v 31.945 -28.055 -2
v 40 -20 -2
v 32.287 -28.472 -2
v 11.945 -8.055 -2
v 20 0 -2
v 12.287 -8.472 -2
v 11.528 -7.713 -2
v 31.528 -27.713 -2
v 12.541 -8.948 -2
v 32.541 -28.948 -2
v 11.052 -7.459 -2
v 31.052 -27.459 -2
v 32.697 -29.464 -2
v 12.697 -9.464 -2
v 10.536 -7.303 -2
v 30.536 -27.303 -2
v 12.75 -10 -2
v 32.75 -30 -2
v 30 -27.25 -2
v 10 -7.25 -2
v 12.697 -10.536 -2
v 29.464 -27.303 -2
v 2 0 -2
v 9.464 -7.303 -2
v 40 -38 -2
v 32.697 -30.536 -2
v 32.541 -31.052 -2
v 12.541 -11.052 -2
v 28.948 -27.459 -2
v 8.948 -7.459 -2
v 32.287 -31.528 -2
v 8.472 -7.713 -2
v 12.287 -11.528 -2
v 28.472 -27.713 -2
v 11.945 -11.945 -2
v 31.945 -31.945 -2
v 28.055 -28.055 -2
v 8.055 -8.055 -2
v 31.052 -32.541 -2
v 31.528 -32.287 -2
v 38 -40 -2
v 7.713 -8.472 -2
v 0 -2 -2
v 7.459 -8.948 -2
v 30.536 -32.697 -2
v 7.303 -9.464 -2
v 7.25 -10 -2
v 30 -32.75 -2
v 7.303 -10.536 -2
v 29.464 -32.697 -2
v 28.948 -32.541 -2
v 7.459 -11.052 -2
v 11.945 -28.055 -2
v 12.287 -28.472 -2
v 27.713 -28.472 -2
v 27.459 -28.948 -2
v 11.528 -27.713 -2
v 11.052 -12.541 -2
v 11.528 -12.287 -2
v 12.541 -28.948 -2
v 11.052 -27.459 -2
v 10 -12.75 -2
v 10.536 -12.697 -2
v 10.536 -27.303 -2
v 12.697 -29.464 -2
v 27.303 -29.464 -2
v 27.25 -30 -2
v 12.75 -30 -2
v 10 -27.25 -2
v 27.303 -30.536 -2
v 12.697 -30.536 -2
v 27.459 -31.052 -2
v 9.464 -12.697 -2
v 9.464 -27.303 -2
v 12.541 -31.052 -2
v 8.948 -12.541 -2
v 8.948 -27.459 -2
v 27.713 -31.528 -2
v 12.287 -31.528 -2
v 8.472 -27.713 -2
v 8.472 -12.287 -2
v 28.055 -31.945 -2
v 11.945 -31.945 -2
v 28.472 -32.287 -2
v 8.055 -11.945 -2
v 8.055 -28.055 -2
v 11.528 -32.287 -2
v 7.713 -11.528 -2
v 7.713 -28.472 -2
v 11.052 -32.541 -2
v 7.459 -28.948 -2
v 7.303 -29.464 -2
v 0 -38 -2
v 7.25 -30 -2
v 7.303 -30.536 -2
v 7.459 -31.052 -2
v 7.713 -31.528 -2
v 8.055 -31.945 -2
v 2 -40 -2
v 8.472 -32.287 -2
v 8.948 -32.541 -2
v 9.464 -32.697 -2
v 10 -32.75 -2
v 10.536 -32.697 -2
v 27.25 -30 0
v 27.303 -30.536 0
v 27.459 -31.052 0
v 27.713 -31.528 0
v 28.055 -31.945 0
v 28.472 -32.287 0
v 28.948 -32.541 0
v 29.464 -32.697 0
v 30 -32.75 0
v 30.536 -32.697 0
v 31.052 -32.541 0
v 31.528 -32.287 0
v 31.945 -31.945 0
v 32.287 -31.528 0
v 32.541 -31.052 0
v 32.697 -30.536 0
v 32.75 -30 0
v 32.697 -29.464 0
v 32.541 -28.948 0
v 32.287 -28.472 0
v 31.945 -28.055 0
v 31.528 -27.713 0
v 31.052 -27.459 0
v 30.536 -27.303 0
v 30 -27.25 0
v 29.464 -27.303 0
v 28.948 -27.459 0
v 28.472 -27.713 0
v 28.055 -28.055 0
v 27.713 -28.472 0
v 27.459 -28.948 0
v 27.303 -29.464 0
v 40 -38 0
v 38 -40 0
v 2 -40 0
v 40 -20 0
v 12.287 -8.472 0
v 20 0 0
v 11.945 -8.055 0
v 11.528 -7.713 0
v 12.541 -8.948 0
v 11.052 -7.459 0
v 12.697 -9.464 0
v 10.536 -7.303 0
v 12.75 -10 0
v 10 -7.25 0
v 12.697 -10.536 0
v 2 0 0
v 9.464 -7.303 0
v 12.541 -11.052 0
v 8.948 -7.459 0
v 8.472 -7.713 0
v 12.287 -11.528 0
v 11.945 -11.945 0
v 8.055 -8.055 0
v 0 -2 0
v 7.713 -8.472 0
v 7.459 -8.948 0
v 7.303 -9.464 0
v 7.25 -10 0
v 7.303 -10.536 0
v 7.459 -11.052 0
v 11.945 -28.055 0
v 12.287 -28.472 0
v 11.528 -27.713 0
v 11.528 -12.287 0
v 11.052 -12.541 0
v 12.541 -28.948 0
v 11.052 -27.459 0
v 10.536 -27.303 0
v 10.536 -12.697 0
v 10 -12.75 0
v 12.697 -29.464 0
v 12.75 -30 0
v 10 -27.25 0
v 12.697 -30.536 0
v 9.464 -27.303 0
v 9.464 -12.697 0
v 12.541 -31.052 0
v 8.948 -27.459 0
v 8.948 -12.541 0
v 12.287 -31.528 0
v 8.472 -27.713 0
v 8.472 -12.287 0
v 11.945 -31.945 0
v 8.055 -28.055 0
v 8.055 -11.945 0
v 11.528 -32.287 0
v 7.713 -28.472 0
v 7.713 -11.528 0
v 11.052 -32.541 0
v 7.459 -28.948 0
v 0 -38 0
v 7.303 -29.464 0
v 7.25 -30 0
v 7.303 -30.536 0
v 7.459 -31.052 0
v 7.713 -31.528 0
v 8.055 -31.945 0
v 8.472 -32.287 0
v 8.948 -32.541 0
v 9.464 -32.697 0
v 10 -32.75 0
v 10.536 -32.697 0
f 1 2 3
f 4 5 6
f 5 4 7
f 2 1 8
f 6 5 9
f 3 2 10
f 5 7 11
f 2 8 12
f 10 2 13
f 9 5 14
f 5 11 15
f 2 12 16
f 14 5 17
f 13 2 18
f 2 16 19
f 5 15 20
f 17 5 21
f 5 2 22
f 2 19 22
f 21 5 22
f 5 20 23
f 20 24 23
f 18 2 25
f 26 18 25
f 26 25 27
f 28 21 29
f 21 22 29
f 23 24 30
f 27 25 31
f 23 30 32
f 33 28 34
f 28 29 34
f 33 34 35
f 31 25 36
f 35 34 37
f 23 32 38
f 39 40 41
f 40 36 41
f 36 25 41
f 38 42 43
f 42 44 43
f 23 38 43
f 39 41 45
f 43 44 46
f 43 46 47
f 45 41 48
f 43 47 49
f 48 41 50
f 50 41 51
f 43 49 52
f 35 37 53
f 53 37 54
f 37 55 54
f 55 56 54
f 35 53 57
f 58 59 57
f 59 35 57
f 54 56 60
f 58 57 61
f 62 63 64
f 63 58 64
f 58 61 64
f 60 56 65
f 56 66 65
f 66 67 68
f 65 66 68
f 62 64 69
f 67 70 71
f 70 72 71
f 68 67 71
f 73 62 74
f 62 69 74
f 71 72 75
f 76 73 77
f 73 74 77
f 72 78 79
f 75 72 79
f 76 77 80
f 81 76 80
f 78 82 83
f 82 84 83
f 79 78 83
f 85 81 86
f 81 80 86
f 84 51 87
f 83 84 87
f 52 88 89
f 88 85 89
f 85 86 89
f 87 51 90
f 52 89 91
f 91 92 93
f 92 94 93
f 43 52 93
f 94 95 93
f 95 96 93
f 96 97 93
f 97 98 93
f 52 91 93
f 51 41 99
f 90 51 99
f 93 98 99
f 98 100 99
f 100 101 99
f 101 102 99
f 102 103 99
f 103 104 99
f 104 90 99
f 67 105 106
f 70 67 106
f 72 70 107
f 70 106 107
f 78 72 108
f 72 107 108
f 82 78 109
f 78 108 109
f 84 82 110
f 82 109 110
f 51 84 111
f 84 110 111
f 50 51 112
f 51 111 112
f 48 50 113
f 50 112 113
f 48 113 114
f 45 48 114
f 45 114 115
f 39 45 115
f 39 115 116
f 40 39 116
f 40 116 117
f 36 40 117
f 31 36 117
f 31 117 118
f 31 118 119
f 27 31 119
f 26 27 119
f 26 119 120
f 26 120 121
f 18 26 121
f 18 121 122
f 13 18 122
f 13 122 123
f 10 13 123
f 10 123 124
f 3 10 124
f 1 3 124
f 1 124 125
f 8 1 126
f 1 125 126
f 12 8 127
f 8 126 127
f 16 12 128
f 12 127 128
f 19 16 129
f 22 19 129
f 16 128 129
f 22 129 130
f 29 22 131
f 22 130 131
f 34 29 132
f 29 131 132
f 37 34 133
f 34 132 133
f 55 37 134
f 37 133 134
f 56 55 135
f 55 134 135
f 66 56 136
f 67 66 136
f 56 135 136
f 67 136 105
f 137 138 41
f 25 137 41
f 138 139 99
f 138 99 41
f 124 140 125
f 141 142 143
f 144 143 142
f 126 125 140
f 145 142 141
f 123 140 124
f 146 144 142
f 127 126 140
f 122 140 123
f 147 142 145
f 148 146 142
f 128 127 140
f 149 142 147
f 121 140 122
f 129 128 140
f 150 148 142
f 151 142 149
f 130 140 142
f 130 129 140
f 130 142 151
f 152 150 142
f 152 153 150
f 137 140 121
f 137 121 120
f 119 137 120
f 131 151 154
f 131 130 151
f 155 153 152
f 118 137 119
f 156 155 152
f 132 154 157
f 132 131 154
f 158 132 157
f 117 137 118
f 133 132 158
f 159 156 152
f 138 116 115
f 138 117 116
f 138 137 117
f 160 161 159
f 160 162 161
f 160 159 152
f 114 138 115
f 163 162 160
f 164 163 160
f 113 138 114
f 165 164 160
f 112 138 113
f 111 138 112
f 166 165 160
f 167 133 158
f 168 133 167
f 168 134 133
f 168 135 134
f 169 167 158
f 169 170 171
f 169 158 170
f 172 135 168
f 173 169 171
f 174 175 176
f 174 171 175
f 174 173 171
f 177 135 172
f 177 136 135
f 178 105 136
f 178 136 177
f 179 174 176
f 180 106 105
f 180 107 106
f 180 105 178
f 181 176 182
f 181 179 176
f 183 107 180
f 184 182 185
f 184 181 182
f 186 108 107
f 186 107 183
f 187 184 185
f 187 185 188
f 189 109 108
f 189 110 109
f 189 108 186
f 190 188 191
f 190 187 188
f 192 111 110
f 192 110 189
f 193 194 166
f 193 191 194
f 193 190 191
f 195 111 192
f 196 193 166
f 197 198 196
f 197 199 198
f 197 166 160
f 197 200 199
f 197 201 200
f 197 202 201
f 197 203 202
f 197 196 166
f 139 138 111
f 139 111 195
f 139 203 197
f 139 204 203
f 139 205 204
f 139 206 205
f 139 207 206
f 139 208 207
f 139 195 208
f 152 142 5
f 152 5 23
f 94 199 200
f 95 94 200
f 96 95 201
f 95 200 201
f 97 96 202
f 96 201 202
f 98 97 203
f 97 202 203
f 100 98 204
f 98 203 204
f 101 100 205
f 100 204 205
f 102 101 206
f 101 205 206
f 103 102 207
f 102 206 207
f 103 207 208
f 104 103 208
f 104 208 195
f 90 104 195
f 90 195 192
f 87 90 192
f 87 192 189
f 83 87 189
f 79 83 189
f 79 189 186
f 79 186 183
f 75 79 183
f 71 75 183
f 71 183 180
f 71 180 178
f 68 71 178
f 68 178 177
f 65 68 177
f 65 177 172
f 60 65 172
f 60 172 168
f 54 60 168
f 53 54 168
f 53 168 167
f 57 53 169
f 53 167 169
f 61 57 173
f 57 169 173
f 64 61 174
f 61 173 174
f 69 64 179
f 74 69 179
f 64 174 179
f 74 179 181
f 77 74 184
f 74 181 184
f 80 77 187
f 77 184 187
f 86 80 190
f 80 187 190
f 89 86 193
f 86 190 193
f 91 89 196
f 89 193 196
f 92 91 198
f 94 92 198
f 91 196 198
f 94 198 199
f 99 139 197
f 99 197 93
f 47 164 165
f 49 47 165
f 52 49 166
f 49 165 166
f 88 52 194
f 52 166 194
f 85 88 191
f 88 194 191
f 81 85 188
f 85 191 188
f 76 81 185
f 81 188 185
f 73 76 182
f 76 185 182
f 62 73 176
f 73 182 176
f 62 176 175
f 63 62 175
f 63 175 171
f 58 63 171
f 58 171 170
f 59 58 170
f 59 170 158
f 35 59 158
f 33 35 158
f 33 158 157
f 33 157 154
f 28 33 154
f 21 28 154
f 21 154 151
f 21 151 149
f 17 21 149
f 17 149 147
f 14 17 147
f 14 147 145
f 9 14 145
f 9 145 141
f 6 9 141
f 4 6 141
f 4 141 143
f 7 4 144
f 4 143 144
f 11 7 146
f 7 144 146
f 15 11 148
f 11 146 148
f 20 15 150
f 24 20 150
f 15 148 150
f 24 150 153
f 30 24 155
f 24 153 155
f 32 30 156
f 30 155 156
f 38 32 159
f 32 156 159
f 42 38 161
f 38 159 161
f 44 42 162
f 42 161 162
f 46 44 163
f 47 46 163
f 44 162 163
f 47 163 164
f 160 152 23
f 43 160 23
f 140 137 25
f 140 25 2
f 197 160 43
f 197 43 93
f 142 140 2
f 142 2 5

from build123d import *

# Parameters (mm, degrees)
EXTRUDE_1_DEPTH   = 2
HOLE_WIZARD_M51_D = 5.5
CHAMFER_1_SIZE    = 2


with BuildPart() as part:
    # Эскиз1 → Бобышка-Вытянуть1 (new body)
    with BuildSketch(Plane(origin=(0, 0, 0), x_dir=(1, 0, 0), z_dir=(0, 0, -1))):
        Polygon((0, 0), (0, 40), (40, 40), (40, 20), (20, 0), align=None)
    extrude(amount=EXTRUDE_1_DEPTH)

    # Отверстие с зазором M51 (through all)
    with Locations(Plane(origin=(0, 0, -2), x_dir=(1, 0, 0), z_dir=(0, 0, -1))):
        with Locations((10, 30), (10, 10), (30, 30)):
            Hole(HOLE_WIZARD_M51_D / 2)

    # Фаска1
    chamfer_1_edges = [part.edges().sort_by_distance(p)[0] for p in [
        (0, 0, -1),
        (0, -40, -1),
        (40, -40, -1),
    ]]
    chamfer(chamfer_1_edges, length=CHAMFER_1_SIZE)


solid = part.part
